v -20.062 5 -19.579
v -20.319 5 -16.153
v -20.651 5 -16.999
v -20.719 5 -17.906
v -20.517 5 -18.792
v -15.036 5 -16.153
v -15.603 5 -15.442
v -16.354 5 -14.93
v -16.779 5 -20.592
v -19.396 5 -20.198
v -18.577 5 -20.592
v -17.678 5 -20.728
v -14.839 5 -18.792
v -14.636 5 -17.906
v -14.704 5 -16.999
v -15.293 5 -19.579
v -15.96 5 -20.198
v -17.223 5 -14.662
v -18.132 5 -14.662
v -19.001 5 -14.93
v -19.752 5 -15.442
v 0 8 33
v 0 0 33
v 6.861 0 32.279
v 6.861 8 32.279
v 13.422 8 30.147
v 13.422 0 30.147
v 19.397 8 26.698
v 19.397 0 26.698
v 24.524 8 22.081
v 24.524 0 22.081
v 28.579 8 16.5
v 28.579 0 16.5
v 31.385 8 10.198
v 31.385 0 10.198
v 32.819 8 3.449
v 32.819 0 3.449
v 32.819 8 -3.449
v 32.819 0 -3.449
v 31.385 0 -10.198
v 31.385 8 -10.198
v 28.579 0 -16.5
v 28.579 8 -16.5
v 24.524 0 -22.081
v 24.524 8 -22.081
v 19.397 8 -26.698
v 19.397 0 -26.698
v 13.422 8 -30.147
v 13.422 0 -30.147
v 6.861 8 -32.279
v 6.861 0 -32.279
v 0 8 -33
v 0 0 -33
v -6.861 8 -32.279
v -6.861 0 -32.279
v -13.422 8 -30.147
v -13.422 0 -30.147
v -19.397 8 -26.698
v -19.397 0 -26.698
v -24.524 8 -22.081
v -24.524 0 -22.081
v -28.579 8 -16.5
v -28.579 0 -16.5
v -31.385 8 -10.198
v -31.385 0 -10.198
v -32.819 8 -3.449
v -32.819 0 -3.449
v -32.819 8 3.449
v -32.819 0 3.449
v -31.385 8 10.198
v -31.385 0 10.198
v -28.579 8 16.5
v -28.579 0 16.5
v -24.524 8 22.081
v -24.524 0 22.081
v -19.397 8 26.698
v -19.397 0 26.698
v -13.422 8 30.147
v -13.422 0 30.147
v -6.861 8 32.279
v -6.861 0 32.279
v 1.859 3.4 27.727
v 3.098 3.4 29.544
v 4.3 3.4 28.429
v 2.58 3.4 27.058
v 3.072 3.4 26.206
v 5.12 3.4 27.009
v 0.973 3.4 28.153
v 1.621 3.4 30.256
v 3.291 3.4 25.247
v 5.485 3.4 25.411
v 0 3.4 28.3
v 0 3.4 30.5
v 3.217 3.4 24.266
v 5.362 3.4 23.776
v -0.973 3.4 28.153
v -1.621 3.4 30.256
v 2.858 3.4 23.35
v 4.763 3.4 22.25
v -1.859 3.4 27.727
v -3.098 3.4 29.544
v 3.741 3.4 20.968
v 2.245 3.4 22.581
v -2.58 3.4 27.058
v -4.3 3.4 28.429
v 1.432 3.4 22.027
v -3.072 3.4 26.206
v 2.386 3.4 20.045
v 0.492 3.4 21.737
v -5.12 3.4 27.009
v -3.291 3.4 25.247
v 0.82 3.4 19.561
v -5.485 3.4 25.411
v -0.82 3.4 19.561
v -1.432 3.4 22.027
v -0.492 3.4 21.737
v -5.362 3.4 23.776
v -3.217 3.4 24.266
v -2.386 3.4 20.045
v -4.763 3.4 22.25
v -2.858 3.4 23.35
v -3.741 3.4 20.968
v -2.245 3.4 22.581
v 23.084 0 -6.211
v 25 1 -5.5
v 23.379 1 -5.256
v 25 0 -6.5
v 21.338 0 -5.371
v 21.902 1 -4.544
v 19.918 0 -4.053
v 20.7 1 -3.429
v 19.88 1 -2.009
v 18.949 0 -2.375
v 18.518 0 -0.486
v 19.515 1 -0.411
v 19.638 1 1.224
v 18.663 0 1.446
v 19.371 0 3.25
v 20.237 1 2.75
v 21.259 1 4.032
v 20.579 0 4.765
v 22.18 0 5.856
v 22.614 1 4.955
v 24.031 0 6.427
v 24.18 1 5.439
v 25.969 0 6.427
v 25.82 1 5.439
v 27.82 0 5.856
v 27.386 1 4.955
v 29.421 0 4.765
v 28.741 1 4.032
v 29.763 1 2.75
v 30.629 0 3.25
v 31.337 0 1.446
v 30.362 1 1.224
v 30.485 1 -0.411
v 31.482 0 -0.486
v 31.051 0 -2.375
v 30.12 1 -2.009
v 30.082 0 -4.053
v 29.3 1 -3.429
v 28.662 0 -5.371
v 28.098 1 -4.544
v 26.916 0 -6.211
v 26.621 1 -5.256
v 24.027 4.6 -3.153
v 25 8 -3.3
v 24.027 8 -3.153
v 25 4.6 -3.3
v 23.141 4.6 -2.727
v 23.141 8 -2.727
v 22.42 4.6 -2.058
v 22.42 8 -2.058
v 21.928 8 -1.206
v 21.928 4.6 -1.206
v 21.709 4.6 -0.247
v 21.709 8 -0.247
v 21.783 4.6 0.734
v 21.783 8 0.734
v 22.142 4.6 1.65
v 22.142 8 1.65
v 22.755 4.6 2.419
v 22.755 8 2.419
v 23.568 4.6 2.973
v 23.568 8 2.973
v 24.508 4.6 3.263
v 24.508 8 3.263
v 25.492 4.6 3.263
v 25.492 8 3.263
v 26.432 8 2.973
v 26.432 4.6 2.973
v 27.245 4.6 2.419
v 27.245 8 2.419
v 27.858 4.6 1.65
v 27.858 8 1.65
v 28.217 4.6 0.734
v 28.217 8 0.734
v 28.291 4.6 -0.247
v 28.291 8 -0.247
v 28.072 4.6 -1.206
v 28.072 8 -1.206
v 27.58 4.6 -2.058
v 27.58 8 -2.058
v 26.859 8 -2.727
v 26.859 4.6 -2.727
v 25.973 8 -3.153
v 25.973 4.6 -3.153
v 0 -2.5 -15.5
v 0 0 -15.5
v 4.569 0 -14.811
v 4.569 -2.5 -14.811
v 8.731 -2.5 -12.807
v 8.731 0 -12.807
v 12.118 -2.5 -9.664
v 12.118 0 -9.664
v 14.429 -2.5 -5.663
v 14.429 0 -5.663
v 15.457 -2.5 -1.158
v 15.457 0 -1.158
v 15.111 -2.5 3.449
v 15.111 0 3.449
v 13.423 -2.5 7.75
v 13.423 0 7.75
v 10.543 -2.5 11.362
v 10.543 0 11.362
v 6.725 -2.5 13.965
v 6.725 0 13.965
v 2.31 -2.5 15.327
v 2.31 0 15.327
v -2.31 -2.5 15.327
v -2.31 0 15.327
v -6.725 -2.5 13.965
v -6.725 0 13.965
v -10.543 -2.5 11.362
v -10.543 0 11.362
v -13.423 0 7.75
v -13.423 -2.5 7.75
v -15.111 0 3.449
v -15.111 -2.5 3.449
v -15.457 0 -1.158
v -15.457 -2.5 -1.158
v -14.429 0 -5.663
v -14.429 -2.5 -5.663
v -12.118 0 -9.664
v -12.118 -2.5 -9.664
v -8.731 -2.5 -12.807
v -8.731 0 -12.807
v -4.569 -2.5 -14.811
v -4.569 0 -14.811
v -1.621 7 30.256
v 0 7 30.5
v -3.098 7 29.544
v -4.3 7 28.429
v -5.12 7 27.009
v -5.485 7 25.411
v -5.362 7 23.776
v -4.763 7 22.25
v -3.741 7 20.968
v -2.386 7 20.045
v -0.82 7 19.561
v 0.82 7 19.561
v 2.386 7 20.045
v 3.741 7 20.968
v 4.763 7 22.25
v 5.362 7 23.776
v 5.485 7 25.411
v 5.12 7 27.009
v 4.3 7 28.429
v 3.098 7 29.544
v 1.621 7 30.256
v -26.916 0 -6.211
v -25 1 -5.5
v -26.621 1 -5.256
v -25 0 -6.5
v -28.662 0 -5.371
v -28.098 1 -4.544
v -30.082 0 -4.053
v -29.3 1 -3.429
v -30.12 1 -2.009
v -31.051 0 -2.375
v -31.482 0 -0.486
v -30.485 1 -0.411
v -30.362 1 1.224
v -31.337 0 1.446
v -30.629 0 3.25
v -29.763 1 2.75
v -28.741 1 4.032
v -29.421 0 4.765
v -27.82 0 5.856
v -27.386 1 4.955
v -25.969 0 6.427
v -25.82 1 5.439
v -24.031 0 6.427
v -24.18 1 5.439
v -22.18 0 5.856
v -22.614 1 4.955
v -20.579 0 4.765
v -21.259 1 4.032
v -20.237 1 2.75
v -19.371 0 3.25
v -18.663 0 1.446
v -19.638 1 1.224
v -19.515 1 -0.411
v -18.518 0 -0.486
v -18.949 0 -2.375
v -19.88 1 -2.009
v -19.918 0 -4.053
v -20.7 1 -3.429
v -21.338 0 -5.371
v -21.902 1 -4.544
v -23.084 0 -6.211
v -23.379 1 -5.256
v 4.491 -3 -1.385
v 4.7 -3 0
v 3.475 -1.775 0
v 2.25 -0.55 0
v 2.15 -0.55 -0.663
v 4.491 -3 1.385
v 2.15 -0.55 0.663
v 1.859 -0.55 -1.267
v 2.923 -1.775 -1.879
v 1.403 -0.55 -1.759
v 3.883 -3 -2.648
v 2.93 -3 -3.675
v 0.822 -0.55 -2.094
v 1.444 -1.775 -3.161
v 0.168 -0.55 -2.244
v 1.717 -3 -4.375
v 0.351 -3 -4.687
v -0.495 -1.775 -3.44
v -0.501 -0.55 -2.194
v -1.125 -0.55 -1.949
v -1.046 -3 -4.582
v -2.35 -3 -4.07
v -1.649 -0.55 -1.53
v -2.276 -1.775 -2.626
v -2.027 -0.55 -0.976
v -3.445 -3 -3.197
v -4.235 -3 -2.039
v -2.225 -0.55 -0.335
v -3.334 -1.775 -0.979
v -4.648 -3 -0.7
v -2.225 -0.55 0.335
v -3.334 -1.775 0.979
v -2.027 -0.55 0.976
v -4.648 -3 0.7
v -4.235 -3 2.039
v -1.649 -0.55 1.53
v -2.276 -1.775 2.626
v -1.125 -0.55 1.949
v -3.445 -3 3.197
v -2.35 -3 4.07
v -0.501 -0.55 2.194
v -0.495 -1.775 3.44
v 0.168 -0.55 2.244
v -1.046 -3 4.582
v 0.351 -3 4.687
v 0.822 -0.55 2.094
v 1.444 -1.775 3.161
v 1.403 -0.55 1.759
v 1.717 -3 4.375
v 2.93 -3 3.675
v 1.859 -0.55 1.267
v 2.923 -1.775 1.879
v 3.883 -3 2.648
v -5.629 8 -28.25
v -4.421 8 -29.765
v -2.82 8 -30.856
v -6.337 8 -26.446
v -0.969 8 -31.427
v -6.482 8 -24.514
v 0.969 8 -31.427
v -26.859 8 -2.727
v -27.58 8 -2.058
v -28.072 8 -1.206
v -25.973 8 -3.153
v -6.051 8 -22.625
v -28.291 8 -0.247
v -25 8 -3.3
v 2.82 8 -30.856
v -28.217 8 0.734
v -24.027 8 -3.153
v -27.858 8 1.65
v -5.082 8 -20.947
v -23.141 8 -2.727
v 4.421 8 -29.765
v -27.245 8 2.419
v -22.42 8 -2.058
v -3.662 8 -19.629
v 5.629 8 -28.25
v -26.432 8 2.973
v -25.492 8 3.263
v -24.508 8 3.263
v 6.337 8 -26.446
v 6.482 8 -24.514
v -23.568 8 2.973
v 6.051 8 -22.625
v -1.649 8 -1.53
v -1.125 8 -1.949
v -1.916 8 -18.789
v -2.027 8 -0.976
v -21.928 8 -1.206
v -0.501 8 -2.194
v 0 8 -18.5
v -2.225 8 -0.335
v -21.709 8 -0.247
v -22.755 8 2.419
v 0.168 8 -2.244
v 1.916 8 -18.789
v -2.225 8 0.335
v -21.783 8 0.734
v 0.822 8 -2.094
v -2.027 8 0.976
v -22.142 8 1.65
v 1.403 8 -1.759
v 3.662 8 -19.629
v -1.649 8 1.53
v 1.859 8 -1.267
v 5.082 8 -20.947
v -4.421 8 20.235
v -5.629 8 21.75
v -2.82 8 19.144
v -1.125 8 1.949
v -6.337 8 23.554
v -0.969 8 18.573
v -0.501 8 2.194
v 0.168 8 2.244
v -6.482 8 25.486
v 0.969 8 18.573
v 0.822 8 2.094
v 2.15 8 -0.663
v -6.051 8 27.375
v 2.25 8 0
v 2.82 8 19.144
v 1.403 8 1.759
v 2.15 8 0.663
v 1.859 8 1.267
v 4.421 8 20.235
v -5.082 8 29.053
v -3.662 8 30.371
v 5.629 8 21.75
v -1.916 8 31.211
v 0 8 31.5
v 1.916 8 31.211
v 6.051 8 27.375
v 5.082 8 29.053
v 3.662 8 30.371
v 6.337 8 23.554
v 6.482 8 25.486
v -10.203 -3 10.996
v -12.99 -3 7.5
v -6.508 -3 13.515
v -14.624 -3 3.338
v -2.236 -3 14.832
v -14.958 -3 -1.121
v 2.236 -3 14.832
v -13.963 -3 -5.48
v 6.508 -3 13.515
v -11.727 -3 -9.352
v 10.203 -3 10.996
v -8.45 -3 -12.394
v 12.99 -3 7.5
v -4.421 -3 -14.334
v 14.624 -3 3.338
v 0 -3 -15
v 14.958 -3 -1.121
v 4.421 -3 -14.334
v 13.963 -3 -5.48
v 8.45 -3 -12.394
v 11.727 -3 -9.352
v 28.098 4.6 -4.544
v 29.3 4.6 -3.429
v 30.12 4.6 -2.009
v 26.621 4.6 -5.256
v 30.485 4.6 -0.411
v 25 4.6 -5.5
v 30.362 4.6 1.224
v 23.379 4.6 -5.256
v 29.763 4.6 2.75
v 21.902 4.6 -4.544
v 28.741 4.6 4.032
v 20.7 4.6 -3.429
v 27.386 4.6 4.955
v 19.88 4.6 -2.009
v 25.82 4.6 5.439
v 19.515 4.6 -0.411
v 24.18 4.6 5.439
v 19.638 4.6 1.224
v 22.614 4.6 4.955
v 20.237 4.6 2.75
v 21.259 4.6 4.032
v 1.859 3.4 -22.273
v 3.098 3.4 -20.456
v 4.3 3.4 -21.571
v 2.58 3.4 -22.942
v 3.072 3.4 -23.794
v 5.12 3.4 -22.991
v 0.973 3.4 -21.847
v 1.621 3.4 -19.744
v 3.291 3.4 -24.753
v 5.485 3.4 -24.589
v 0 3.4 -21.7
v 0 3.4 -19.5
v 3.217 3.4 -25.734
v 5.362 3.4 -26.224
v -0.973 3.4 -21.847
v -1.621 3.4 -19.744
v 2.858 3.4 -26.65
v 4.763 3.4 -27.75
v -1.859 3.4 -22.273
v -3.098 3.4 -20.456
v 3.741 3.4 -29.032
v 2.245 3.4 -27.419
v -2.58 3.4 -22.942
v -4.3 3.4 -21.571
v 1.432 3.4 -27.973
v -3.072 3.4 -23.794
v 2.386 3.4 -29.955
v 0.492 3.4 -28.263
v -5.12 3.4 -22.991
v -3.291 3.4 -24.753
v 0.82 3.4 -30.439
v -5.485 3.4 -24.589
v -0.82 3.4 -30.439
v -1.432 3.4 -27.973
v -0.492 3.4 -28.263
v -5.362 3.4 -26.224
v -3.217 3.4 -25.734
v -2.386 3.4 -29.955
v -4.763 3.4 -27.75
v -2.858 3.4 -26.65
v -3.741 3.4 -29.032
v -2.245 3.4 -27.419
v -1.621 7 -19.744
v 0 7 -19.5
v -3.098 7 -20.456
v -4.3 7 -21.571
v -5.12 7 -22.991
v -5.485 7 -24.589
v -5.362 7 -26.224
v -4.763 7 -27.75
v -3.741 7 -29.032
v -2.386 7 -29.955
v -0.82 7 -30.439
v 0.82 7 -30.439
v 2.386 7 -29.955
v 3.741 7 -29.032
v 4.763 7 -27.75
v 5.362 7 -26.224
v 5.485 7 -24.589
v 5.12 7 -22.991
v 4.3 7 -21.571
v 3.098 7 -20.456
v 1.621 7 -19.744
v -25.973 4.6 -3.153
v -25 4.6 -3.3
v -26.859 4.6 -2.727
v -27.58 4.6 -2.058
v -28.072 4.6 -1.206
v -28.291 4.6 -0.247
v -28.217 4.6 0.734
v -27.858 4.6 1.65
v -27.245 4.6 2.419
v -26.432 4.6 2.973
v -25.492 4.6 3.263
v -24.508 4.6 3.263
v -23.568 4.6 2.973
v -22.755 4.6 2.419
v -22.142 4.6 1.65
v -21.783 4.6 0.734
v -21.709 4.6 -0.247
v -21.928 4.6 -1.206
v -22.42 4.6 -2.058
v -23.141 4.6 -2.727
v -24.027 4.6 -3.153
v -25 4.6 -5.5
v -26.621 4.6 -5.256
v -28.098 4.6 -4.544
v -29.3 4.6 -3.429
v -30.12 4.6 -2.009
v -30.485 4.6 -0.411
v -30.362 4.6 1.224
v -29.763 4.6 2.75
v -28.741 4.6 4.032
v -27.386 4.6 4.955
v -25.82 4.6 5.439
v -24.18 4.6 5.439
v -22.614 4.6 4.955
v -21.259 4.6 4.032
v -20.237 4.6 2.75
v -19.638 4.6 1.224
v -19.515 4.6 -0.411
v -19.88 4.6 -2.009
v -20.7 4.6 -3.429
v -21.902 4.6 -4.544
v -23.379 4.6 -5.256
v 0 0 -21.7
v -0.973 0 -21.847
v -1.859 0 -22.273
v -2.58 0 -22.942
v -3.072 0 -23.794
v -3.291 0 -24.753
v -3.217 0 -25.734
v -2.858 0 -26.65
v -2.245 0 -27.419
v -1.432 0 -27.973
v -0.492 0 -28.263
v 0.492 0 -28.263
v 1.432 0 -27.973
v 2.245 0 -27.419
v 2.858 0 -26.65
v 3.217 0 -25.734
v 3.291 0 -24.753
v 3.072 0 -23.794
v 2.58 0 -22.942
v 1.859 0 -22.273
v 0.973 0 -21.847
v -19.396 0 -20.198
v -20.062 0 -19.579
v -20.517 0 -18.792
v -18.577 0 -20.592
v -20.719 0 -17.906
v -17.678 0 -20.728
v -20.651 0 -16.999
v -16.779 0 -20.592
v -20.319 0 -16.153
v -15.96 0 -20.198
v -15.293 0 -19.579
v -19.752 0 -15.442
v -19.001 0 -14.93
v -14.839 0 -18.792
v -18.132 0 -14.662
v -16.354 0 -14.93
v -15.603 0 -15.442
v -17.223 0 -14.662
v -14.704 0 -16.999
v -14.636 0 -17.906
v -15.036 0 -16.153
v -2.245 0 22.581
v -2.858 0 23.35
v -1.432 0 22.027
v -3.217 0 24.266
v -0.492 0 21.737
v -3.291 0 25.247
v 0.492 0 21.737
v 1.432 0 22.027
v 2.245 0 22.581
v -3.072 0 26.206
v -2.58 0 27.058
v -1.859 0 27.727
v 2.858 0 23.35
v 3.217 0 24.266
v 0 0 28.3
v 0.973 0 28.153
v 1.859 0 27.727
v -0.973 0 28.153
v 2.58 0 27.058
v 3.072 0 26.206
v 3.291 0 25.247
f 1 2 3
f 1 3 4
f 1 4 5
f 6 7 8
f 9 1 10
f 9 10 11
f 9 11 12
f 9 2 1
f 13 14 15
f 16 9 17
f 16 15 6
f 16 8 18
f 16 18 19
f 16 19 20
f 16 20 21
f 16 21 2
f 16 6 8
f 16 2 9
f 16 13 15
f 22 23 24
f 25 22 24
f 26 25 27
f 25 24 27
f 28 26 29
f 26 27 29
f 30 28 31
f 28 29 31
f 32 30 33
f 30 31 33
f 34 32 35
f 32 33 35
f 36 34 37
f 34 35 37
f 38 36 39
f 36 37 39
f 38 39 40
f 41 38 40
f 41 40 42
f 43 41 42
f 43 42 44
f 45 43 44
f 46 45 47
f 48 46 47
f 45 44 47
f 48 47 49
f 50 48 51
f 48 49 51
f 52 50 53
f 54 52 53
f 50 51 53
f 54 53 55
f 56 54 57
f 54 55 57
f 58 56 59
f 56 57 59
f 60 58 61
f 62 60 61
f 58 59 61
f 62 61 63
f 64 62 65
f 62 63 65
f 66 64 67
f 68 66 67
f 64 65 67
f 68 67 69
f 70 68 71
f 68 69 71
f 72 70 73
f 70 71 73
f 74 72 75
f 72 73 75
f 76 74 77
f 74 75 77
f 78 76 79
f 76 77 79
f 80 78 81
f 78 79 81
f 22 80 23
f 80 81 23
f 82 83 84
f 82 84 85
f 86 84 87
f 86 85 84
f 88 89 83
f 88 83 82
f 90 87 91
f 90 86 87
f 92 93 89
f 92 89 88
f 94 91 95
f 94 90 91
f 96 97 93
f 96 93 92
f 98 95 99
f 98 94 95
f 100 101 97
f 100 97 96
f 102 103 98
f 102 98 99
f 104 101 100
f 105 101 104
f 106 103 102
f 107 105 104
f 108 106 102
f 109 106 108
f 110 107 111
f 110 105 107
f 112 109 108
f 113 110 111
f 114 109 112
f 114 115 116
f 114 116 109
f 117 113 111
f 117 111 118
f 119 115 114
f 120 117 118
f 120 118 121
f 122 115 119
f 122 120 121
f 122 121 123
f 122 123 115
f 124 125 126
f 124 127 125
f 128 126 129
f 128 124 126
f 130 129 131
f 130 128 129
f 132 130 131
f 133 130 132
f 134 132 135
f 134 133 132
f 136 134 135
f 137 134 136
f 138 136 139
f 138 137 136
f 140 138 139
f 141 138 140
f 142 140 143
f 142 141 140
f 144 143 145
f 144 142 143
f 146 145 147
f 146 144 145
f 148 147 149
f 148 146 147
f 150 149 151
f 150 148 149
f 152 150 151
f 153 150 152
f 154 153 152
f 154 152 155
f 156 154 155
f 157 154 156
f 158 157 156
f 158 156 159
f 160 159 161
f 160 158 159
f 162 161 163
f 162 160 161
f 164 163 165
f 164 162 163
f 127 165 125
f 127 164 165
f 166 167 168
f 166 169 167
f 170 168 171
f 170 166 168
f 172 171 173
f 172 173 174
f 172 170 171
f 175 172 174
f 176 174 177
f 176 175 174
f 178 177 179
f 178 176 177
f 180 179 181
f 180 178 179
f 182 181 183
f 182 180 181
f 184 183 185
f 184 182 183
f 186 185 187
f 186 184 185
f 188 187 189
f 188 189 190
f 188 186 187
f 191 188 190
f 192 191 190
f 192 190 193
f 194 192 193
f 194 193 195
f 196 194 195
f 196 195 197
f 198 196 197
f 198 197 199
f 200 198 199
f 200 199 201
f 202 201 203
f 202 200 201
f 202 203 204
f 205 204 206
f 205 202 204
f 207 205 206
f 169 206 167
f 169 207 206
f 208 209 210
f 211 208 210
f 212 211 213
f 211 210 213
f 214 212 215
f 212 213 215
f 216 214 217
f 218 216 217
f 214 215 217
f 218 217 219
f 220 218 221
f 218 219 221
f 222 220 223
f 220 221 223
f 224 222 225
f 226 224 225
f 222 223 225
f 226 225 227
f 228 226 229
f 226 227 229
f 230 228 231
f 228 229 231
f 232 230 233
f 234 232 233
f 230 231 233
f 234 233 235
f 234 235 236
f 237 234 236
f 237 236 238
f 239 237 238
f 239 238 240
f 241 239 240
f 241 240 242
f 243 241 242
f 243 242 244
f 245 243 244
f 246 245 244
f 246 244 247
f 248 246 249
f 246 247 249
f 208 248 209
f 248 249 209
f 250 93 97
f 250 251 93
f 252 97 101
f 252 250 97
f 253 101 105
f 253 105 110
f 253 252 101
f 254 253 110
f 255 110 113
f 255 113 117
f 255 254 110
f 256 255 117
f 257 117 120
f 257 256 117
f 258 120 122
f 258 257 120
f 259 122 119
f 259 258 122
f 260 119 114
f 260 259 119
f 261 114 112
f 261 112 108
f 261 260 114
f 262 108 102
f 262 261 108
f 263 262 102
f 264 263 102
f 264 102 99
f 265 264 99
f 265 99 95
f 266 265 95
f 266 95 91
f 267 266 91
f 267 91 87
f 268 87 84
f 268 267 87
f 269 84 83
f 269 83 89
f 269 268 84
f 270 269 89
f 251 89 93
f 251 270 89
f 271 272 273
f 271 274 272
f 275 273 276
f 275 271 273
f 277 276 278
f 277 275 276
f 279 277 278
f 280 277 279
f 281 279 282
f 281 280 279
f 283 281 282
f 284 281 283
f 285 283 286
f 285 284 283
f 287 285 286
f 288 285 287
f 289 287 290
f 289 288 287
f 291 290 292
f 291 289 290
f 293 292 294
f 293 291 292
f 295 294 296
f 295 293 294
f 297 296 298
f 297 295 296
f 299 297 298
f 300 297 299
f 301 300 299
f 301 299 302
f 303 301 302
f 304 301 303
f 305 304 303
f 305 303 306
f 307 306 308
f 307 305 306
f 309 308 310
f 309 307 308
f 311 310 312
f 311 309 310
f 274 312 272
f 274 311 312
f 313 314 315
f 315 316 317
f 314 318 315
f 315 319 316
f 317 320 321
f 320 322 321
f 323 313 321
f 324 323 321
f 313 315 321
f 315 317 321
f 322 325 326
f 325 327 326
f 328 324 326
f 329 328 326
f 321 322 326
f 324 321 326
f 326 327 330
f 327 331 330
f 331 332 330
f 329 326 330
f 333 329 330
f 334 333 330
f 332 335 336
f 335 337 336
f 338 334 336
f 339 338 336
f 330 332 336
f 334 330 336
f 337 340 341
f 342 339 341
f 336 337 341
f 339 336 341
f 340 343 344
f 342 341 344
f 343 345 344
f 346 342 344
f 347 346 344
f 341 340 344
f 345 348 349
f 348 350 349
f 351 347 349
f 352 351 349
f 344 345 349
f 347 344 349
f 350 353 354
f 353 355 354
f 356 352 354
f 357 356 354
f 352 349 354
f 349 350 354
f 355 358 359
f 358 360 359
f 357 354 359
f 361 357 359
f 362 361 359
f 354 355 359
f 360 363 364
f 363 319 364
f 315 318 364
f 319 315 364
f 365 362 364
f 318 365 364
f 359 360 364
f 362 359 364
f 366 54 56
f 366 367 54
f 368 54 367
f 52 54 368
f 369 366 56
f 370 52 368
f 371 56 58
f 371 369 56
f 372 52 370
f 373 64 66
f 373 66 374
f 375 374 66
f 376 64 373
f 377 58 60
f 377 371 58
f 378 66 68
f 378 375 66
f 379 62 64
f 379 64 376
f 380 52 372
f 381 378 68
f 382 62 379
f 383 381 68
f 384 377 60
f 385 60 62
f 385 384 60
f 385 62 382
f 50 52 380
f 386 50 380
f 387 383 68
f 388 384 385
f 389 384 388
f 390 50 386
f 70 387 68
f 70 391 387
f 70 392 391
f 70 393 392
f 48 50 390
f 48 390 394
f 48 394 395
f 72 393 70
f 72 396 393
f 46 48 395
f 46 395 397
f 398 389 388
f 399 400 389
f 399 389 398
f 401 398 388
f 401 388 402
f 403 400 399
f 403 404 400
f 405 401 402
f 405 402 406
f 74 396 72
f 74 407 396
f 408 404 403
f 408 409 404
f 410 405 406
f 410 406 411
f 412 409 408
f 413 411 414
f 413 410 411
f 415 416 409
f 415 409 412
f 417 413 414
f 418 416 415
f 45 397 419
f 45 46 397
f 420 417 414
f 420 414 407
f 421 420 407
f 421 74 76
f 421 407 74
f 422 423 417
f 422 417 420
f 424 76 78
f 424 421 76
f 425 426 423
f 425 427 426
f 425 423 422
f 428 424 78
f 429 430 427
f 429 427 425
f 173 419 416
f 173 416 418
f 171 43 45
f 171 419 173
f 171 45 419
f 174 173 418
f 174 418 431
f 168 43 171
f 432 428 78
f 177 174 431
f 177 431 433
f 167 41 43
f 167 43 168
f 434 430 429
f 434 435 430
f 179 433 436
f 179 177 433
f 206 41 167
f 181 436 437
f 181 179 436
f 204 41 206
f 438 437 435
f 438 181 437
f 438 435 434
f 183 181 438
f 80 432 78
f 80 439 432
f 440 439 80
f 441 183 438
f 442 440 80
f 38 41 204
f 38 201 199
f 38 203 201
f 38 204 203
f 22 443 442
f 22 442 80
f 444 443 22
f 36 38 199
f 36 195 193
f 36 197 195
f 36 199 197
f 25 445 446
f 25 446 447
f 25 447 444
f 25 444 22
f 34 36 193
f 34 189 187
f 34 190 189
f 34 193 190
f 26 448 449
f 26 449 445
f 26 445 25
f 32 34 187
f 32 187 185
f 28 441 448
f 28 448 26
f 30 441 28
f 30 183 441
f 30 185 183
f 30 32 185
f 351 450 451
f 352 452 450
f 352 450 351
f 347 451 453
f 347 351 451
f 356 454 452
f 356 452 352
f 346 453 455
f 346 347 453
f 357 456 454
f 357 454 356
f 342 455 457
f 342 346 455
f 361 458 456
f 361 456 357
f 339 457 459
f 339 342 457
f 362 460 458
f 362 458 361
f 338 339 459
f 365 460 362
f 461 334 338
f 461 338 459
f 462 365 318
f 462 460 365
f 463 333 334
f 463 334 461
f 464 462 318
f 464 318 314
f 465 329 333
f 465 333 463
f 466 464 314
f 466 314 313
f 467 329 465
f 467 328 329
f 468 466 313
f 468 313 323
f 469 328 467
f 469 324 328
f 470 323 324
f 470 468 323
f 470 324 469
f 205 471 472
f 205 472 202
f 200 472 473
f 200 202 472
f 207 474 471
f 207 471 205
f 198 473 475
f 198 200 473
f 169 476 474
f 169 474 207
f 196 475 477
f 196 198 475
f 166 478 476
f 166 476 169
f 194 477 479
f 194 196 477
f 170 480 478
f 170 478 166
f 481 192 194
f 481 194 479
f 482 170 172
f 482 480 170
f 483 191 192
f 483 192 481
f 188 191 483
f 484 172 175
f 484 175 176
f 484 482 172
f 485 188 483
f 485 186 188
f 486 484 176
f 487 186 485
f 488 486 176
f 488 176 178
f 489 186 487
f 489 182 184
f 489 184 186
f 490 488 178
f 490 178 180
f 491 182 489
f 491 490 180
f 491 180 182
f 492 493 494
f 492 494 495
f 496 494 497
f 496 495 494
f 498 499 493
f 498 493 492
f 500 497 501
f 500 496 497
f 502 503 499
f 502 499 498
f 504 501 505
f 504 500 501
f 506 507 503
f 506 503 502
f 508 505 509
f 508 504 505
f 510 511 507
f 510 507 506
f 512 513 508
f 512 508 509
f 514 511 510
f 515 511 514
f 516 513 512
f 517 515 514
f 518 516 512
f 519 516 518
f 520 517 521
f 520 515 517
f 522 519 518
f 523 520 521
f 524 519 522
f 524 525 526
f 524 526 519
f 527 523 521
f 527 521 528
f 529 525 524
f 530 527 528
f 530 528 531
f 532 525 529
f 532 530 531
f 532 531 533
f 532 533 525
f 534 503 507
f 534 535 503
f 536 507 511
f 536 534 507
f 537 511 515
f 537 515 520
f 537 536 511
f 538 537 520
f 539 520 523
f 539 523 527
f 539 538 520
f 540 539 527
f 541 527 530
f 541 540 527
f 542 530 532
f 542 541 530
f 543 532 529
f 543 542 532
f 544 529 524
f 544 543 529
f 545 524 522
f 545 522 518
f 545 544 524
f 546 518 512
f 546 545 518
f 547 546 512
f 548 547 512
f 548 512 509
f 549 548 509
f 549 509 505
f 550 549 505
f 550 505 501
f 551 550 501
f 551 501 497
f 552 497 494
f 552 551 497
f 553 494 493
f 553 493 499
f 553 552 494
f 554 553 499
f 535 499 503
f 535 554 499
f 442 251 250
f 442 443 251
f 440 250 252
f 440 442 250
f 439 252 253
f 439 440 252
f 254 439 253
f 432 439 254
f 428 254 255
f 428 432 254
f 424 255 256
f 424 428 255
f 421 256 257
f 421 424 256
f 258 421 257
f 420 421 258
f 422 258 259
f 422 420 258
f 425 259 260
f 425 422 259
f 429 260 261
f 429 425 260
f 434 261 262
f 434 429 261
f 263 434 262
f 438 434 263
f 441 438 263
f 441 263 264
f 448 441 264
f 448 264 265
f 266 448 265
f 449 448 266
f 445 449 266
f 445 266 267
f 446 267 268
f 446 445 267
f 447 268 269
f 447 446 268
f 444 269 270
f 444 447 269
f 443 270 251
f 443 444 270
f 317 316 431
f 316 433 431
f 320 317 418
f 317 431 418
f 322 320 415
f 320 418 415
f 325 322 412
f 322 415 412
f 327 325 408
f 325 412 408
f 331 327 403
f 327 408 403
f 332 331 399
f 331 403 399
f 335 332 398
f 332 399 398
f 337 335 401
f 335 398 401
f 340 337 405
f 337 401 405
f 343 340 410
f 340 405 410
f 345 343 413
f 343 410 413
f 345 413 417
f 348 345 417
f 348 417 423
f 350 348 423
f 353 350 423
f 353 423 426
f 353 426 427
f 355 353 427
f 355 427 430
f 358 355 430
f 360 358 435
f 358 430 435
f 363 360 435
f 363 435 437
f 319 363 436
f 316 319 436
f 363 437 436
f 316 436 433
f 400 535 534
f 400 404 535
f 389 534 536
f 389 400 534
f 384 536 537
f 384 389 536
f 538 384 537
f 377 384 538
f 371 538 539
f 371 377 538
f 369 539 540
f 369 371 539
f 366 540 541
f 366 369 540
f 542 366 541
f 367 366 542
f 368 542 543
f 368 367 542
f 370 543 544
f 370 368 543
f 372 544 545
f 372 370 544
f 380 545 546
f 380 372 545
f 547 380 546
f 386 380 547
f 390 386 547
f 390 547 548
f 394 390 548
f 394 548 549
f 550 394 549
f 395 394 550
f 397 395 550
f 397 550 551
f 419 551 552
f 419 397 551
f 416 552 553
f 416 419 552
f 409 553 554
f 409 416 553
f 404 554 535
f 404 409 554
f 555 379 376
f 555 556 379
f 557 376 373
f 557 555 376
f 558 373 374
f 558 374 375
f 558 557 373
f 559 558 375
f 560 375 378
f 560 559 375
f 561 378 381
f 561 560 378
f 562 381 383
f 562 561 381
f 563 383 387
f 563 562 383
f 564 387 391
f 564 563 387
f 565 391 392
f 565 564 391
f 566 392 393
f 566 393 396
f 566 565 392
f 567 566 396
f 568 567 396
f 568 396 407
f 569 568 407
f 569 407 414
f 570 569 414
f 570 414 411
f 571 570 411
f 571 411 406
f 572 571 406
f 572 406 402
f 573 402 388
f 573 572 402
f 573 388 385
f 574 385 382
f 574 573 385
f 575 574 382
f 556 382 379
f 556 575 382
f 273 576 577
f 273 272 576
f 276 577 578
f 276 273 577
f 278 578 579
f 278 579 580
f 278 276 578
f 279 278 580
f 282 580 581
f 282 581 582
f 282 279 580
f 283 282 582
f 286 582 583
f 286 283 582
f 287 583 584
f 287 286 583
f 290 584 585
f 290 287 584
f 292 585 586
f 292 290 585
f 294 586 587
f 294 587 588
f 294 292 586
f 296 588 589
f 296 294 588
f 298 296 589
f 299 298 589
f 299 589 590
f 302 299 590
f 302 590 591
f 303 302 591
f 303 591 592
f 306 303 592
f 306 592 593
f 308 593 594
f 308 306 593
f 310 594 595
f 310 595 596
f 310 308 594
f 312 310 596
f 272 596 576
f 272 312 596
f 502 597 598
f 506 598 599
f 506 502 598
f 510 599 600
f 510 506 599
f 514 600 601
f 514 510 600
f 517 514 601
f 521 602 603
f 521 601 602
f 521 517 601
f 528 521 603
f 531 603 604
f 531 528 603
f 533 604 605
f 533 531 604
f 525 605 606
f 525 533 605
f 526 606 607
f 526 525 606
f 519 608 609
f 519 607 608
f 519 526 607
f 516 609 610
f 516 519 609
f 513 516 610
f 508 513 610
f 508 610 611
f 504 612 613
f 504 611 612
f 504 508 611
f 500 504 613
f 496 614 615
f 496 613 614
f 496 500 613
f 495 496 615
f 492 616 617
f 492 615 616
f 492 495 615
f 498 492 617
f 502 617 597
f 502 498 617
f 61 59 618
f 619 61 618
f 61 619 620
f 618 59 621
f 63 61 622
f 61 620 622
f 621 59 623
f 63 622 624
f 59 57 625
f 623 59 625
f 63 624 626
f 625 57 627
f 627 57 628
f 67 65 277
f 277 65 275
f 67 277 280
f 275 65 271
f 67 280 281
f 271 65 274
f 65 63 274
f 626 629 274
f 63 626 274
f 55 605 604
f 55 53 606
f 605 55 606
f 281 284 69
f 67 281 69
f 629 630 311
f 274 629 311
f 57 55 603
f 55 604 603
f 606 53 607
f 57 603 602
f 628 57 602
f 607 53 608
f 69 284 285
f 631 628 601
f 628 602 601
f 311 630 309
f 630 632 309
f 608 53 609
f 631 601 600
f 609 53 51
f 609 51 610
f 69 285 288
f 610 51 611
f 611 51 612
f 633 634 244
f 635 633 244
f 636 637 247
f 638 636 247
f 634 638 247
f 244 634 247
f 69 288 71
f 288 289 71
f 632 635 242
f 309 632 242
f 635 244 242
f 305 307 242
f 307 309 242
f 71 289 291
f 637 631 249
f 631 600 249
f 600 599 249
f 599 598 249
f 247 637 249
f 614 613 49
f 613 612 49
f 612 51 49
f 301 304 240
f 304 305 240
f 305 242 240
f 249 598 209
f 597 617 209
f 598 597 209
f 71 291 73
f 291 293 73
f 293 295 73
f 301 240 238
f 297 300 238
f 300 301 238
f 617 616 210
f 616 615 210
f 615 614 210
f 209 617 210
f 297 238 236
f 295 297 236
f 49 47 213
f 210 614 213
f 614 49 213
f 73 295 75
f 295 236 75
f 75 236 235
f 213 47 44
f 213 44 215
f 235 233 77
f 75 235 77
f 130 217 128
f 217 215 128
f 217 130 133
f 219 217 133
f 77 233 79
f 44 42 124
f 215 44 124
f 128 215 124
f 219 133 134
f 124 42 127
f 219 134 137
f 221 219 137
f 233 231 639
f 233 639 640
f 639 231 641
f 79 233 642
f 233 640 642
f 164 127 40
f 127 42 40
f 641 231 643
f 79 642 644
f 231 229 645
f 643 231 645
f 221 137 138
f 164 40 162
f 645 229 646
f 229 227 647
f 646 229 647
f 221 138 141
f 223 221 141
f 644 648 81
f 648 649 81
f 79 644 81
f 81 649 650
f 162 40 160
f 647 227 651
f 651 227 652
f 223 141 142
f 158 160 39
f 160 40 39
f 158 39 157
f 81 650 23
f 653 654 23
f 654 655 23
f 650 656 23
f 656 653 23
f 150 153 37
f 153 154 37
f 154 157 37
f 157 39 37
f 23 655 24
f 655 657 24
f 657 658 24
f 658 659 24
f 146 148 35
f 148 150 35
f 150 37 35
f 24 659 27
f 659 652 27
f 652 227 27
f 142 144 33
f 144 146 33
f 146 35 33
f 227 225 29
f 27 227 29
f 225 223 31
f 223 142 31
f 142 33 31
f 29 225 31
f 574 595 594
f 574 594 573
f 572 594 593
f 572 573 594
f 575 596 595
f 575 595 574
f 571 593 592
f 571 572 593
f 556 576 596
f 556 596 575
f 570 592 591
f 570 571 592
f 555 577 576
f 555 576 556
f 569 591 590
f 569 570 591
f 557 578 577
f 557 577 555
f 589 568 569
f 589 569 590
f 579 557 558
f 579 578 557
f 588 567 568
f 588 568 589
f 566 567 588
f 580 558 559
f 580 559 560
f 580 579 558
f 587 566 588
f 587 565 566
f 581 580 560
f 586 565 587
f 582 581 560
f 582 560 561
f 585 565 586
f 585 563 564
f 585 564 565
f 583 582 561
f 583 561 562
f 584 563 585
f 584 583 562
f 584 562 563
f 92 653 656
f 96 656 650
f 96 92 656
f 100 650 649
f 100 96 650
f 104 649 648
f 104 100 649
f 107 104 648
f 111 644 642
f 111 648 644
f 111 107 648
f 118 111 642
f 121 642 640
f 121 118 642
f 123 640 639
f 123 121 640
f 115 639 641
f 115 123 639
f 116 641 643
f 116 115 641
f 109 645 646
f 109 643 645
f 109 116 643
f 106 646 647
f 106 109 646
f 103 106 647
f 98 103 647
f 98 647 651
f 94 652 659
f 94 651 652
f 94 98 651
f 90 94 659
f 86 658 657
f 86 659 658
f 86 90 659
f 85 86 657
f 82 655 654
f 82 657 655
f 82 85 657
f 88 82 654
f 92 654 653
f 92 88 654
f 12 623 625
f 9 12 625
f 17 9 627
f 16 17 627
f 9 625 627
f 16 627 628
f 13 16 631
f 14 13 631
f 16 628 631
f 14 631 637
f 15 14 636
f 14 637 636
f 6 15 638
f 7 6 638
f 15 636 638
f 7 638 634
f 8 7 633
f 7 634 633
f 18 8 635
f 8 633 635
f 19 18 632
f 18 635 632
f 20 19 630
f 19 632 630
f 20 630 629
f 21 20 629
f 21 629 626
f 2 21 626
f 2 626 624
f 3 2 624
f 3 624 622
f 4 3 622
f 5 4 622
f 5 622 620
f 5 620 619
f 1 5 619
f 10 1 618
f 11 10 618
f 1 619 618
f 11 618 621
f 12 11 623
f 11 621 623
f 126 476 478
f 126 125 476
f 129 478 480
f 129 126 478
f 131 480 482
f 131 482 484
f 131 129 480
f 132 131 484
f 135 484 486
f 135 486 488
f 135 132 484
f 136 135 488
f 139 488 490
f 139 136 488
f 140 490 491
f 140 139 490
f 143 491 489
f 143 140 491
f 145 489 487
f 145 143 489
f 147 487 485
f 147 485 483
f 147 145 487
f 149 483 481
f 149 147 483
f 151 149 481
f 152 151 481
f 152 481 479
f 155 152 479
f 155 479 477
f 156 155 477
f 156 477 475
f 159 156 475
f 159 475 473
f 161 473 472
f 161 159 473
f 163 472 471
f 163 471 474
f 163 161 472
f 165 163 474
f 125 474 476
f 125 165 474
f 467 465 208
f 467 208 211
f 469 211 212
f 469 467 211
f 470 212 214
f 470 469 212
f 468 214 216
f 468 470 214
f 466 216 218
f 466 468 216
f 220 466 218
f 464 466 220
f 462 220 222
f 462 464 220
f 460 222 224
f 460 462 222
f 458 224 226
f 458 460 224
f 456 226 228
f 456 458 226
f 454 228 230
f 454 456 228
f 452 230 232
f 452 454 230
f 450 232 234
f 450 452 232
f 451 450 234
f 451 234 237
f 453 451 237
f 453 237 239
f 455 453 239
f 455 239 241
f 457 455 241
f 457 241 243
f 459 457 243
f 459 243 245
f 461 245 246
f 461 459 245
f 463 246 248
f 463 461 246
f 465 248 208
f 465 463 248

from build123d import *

# Parameters (mm, degrees)
SKETCH1_R                                           = 33
BOSS_EXTRUDE1_DEPTH                                 = 8
SKETCH2_R                                           = 15.5
BOSS_EXTRUDE2_DEPTH                                 = 3
SKETCH4_R                                           = 3.05
CUT_EXTRUDE2_DEPTH                                  = 5
CHAMFER1_SIZE                                       = 0.5
CBORE_FOR_M6_HEX_SOCKET_THIN_HEAD_CA_2_COUNT        = 2
CBORE_FOR_M6_HEX_SOCKET_THIN_HEAD_CA_2_PITCH        = 50
CBORE_FOR_M6_HEX_SOCKET_THIN_HEAD_CA_3_A_COUNT      = 2
CBORE_FOR_M6_HEX_SOCKET_THIN_HEAD_CA_3_A_PITCH      = 50
CSK_FOR_M4_COUNTERSUNK_FLAT_HEAD_SCREW1_D           = 4.5
CSK_FOR_M4_COUNTERSUNK_FLAT_HEAD_SCREW1_CSINK_D     = 9.4
CSK_FOR_M4_COUNTERSUNK_FLAT_HEAD_SCREW1_CSINK_ANGLE = 90


with BuildPart() as part:
    # Sketch1 → Boss-Extrude1 (new body)
    with BuildSketch(Plane(origin=(0, 0, 0), x_dir=(1, 0, 0), z_dir=(0, 1, 0))):
        with Locations(Location((0, 0, 0), (0, 0, 270))):
            Circle(SKETCH1_R)
    extrude(amount=BOSS_EXTRUDE1_DEPTH)

    # Sketch2 → Boss-Extrude2 (add)
    with BuildSketch(Plane(origin=(0, 0, 0), x_dir=(-1, 0, 0), z_dir=(0, -1, 0))):
        with Locations(Location((0, 0, 0), (0, 0, 90))):
            Circle(SKETCH2_R)
    extrude(amount=BOSS_EXTRUDE2_DEPTH)

    # Sketch4 → Cut-Extrude2 (cut)
    with BuildSketch(Plane.XZ):
        with Locations(Location((-17.67766953, -17.67766953, 0), (0, 0, 270))):
            Circle(SKETCH4_R)
    extrude(amount=-CUT_EXTRUDE2_DEPTH, mode=Mode.SUBTRACT)

    # Chamfer1
    chamfer1_edges = [part.edges().sort_by_distance(p)[0] for p in [
        (0, -3, 15.5),
    ]]
    chamfer(chamfer1_edges, length=CHAMFER1_SIZE)

    # Sketch8 → CBORE for M6 Hex Socket Thin Head Cap Sc (revolve, cut)
    with BuildSketch(Plane(origin=(-25, 0, 0), x_dir=(0, 0, -1), z_dir=(1, 0, 0))):
        Polygon((0, 0), (0, 8), (3.3, 8), (3.3, 4.6), (5.5, 4.6), (5.5, 1), (6.5, 0), align=None)
    cbore_for_m6_hex_socket_thin_head_cap_sc = revolve(axis=Axis((-25, -6.35, 0), (0, 1, 0)), mode=Mode.SUBTRACT)

    # CBORE for M6 Hex Socket Thin Head Ca 2: CBORE for M6 Hex Socket Thin Head Cap Sc ×2
    with Locations(*[(i * CBORE_FOR_M6_HEX_SOCKET_THIN_HEAD_CA_2_PITCH, 0, 0) for i in range(1, CBORE_FOR_M6_HEX_SOCKET_THIN_HEAD_CA_2_COUNT)]):
        add(cbore_for_m6_hex_socket_thin_head_cap_sc, mode=Mode.SUBTRACT)

    # Sketch10 → CBORE for M6 Hex Socket Thin Head Ca 3 (revolve, cut)
    with BuildSketch(Plane(origin=(0, 8, -25), x_dir=(0, 0, 1), z_dir=(1, 0, 0))):
        Polygon((0, 0), (0, 11), (3.3, 11), (3.3, 4.6), (5.5, 4.6), (5.5, 1), (6.5, 0), align=None)
    cbore_for_m6_hex_socket_thin_head_ca_3 = revolve(axis=Axis((0, 14.35, -25), (0, -1, 0)), mode=Mode.SUBTRACT)

    # CBORE for M6 Hex Socket Thin Head Ca 3 a: CBORE for M6 Hex Socket Thin Head Ca 3 ×2
    with Locations(*[(0, 0, i * CBORE_FOR_M6_HEX_SOCKET_THIN_HEAD_CA_3_A_PITCH) for i in range(1, CBORE_FOR_M6_HEX_SOCKET_THIN_HEAD_CA_3_A_COUNT)]):
        add(cbore_for_m6_hex_socket_thin_head_ca_3, mode=Mode.SUBTRACT)

    # CSK for M4 Countersunk Flat Head Screw1 (through all)
    with Locations(Plane(origin=(0, -3, 0), x_dir=(-1, 0, 0), z_dir=(0, -1, 0))):
        with Locations((0, 0)):
            CounterSinkHole(CSK_FOR_M4_COUNTERSUNK_FLAT_HEAD_SCREW1_D / 2, CSK_FOR_M4_COUNTERSUNK_FLAT_HEAD_SCREW1_CSINK_D / 2, counter_sink_angle=CSK_FOR_M4_COUNTERSUNK_FLAT_HEAD_SCREW1_CSINK_ANGLE)


solid = part.part
